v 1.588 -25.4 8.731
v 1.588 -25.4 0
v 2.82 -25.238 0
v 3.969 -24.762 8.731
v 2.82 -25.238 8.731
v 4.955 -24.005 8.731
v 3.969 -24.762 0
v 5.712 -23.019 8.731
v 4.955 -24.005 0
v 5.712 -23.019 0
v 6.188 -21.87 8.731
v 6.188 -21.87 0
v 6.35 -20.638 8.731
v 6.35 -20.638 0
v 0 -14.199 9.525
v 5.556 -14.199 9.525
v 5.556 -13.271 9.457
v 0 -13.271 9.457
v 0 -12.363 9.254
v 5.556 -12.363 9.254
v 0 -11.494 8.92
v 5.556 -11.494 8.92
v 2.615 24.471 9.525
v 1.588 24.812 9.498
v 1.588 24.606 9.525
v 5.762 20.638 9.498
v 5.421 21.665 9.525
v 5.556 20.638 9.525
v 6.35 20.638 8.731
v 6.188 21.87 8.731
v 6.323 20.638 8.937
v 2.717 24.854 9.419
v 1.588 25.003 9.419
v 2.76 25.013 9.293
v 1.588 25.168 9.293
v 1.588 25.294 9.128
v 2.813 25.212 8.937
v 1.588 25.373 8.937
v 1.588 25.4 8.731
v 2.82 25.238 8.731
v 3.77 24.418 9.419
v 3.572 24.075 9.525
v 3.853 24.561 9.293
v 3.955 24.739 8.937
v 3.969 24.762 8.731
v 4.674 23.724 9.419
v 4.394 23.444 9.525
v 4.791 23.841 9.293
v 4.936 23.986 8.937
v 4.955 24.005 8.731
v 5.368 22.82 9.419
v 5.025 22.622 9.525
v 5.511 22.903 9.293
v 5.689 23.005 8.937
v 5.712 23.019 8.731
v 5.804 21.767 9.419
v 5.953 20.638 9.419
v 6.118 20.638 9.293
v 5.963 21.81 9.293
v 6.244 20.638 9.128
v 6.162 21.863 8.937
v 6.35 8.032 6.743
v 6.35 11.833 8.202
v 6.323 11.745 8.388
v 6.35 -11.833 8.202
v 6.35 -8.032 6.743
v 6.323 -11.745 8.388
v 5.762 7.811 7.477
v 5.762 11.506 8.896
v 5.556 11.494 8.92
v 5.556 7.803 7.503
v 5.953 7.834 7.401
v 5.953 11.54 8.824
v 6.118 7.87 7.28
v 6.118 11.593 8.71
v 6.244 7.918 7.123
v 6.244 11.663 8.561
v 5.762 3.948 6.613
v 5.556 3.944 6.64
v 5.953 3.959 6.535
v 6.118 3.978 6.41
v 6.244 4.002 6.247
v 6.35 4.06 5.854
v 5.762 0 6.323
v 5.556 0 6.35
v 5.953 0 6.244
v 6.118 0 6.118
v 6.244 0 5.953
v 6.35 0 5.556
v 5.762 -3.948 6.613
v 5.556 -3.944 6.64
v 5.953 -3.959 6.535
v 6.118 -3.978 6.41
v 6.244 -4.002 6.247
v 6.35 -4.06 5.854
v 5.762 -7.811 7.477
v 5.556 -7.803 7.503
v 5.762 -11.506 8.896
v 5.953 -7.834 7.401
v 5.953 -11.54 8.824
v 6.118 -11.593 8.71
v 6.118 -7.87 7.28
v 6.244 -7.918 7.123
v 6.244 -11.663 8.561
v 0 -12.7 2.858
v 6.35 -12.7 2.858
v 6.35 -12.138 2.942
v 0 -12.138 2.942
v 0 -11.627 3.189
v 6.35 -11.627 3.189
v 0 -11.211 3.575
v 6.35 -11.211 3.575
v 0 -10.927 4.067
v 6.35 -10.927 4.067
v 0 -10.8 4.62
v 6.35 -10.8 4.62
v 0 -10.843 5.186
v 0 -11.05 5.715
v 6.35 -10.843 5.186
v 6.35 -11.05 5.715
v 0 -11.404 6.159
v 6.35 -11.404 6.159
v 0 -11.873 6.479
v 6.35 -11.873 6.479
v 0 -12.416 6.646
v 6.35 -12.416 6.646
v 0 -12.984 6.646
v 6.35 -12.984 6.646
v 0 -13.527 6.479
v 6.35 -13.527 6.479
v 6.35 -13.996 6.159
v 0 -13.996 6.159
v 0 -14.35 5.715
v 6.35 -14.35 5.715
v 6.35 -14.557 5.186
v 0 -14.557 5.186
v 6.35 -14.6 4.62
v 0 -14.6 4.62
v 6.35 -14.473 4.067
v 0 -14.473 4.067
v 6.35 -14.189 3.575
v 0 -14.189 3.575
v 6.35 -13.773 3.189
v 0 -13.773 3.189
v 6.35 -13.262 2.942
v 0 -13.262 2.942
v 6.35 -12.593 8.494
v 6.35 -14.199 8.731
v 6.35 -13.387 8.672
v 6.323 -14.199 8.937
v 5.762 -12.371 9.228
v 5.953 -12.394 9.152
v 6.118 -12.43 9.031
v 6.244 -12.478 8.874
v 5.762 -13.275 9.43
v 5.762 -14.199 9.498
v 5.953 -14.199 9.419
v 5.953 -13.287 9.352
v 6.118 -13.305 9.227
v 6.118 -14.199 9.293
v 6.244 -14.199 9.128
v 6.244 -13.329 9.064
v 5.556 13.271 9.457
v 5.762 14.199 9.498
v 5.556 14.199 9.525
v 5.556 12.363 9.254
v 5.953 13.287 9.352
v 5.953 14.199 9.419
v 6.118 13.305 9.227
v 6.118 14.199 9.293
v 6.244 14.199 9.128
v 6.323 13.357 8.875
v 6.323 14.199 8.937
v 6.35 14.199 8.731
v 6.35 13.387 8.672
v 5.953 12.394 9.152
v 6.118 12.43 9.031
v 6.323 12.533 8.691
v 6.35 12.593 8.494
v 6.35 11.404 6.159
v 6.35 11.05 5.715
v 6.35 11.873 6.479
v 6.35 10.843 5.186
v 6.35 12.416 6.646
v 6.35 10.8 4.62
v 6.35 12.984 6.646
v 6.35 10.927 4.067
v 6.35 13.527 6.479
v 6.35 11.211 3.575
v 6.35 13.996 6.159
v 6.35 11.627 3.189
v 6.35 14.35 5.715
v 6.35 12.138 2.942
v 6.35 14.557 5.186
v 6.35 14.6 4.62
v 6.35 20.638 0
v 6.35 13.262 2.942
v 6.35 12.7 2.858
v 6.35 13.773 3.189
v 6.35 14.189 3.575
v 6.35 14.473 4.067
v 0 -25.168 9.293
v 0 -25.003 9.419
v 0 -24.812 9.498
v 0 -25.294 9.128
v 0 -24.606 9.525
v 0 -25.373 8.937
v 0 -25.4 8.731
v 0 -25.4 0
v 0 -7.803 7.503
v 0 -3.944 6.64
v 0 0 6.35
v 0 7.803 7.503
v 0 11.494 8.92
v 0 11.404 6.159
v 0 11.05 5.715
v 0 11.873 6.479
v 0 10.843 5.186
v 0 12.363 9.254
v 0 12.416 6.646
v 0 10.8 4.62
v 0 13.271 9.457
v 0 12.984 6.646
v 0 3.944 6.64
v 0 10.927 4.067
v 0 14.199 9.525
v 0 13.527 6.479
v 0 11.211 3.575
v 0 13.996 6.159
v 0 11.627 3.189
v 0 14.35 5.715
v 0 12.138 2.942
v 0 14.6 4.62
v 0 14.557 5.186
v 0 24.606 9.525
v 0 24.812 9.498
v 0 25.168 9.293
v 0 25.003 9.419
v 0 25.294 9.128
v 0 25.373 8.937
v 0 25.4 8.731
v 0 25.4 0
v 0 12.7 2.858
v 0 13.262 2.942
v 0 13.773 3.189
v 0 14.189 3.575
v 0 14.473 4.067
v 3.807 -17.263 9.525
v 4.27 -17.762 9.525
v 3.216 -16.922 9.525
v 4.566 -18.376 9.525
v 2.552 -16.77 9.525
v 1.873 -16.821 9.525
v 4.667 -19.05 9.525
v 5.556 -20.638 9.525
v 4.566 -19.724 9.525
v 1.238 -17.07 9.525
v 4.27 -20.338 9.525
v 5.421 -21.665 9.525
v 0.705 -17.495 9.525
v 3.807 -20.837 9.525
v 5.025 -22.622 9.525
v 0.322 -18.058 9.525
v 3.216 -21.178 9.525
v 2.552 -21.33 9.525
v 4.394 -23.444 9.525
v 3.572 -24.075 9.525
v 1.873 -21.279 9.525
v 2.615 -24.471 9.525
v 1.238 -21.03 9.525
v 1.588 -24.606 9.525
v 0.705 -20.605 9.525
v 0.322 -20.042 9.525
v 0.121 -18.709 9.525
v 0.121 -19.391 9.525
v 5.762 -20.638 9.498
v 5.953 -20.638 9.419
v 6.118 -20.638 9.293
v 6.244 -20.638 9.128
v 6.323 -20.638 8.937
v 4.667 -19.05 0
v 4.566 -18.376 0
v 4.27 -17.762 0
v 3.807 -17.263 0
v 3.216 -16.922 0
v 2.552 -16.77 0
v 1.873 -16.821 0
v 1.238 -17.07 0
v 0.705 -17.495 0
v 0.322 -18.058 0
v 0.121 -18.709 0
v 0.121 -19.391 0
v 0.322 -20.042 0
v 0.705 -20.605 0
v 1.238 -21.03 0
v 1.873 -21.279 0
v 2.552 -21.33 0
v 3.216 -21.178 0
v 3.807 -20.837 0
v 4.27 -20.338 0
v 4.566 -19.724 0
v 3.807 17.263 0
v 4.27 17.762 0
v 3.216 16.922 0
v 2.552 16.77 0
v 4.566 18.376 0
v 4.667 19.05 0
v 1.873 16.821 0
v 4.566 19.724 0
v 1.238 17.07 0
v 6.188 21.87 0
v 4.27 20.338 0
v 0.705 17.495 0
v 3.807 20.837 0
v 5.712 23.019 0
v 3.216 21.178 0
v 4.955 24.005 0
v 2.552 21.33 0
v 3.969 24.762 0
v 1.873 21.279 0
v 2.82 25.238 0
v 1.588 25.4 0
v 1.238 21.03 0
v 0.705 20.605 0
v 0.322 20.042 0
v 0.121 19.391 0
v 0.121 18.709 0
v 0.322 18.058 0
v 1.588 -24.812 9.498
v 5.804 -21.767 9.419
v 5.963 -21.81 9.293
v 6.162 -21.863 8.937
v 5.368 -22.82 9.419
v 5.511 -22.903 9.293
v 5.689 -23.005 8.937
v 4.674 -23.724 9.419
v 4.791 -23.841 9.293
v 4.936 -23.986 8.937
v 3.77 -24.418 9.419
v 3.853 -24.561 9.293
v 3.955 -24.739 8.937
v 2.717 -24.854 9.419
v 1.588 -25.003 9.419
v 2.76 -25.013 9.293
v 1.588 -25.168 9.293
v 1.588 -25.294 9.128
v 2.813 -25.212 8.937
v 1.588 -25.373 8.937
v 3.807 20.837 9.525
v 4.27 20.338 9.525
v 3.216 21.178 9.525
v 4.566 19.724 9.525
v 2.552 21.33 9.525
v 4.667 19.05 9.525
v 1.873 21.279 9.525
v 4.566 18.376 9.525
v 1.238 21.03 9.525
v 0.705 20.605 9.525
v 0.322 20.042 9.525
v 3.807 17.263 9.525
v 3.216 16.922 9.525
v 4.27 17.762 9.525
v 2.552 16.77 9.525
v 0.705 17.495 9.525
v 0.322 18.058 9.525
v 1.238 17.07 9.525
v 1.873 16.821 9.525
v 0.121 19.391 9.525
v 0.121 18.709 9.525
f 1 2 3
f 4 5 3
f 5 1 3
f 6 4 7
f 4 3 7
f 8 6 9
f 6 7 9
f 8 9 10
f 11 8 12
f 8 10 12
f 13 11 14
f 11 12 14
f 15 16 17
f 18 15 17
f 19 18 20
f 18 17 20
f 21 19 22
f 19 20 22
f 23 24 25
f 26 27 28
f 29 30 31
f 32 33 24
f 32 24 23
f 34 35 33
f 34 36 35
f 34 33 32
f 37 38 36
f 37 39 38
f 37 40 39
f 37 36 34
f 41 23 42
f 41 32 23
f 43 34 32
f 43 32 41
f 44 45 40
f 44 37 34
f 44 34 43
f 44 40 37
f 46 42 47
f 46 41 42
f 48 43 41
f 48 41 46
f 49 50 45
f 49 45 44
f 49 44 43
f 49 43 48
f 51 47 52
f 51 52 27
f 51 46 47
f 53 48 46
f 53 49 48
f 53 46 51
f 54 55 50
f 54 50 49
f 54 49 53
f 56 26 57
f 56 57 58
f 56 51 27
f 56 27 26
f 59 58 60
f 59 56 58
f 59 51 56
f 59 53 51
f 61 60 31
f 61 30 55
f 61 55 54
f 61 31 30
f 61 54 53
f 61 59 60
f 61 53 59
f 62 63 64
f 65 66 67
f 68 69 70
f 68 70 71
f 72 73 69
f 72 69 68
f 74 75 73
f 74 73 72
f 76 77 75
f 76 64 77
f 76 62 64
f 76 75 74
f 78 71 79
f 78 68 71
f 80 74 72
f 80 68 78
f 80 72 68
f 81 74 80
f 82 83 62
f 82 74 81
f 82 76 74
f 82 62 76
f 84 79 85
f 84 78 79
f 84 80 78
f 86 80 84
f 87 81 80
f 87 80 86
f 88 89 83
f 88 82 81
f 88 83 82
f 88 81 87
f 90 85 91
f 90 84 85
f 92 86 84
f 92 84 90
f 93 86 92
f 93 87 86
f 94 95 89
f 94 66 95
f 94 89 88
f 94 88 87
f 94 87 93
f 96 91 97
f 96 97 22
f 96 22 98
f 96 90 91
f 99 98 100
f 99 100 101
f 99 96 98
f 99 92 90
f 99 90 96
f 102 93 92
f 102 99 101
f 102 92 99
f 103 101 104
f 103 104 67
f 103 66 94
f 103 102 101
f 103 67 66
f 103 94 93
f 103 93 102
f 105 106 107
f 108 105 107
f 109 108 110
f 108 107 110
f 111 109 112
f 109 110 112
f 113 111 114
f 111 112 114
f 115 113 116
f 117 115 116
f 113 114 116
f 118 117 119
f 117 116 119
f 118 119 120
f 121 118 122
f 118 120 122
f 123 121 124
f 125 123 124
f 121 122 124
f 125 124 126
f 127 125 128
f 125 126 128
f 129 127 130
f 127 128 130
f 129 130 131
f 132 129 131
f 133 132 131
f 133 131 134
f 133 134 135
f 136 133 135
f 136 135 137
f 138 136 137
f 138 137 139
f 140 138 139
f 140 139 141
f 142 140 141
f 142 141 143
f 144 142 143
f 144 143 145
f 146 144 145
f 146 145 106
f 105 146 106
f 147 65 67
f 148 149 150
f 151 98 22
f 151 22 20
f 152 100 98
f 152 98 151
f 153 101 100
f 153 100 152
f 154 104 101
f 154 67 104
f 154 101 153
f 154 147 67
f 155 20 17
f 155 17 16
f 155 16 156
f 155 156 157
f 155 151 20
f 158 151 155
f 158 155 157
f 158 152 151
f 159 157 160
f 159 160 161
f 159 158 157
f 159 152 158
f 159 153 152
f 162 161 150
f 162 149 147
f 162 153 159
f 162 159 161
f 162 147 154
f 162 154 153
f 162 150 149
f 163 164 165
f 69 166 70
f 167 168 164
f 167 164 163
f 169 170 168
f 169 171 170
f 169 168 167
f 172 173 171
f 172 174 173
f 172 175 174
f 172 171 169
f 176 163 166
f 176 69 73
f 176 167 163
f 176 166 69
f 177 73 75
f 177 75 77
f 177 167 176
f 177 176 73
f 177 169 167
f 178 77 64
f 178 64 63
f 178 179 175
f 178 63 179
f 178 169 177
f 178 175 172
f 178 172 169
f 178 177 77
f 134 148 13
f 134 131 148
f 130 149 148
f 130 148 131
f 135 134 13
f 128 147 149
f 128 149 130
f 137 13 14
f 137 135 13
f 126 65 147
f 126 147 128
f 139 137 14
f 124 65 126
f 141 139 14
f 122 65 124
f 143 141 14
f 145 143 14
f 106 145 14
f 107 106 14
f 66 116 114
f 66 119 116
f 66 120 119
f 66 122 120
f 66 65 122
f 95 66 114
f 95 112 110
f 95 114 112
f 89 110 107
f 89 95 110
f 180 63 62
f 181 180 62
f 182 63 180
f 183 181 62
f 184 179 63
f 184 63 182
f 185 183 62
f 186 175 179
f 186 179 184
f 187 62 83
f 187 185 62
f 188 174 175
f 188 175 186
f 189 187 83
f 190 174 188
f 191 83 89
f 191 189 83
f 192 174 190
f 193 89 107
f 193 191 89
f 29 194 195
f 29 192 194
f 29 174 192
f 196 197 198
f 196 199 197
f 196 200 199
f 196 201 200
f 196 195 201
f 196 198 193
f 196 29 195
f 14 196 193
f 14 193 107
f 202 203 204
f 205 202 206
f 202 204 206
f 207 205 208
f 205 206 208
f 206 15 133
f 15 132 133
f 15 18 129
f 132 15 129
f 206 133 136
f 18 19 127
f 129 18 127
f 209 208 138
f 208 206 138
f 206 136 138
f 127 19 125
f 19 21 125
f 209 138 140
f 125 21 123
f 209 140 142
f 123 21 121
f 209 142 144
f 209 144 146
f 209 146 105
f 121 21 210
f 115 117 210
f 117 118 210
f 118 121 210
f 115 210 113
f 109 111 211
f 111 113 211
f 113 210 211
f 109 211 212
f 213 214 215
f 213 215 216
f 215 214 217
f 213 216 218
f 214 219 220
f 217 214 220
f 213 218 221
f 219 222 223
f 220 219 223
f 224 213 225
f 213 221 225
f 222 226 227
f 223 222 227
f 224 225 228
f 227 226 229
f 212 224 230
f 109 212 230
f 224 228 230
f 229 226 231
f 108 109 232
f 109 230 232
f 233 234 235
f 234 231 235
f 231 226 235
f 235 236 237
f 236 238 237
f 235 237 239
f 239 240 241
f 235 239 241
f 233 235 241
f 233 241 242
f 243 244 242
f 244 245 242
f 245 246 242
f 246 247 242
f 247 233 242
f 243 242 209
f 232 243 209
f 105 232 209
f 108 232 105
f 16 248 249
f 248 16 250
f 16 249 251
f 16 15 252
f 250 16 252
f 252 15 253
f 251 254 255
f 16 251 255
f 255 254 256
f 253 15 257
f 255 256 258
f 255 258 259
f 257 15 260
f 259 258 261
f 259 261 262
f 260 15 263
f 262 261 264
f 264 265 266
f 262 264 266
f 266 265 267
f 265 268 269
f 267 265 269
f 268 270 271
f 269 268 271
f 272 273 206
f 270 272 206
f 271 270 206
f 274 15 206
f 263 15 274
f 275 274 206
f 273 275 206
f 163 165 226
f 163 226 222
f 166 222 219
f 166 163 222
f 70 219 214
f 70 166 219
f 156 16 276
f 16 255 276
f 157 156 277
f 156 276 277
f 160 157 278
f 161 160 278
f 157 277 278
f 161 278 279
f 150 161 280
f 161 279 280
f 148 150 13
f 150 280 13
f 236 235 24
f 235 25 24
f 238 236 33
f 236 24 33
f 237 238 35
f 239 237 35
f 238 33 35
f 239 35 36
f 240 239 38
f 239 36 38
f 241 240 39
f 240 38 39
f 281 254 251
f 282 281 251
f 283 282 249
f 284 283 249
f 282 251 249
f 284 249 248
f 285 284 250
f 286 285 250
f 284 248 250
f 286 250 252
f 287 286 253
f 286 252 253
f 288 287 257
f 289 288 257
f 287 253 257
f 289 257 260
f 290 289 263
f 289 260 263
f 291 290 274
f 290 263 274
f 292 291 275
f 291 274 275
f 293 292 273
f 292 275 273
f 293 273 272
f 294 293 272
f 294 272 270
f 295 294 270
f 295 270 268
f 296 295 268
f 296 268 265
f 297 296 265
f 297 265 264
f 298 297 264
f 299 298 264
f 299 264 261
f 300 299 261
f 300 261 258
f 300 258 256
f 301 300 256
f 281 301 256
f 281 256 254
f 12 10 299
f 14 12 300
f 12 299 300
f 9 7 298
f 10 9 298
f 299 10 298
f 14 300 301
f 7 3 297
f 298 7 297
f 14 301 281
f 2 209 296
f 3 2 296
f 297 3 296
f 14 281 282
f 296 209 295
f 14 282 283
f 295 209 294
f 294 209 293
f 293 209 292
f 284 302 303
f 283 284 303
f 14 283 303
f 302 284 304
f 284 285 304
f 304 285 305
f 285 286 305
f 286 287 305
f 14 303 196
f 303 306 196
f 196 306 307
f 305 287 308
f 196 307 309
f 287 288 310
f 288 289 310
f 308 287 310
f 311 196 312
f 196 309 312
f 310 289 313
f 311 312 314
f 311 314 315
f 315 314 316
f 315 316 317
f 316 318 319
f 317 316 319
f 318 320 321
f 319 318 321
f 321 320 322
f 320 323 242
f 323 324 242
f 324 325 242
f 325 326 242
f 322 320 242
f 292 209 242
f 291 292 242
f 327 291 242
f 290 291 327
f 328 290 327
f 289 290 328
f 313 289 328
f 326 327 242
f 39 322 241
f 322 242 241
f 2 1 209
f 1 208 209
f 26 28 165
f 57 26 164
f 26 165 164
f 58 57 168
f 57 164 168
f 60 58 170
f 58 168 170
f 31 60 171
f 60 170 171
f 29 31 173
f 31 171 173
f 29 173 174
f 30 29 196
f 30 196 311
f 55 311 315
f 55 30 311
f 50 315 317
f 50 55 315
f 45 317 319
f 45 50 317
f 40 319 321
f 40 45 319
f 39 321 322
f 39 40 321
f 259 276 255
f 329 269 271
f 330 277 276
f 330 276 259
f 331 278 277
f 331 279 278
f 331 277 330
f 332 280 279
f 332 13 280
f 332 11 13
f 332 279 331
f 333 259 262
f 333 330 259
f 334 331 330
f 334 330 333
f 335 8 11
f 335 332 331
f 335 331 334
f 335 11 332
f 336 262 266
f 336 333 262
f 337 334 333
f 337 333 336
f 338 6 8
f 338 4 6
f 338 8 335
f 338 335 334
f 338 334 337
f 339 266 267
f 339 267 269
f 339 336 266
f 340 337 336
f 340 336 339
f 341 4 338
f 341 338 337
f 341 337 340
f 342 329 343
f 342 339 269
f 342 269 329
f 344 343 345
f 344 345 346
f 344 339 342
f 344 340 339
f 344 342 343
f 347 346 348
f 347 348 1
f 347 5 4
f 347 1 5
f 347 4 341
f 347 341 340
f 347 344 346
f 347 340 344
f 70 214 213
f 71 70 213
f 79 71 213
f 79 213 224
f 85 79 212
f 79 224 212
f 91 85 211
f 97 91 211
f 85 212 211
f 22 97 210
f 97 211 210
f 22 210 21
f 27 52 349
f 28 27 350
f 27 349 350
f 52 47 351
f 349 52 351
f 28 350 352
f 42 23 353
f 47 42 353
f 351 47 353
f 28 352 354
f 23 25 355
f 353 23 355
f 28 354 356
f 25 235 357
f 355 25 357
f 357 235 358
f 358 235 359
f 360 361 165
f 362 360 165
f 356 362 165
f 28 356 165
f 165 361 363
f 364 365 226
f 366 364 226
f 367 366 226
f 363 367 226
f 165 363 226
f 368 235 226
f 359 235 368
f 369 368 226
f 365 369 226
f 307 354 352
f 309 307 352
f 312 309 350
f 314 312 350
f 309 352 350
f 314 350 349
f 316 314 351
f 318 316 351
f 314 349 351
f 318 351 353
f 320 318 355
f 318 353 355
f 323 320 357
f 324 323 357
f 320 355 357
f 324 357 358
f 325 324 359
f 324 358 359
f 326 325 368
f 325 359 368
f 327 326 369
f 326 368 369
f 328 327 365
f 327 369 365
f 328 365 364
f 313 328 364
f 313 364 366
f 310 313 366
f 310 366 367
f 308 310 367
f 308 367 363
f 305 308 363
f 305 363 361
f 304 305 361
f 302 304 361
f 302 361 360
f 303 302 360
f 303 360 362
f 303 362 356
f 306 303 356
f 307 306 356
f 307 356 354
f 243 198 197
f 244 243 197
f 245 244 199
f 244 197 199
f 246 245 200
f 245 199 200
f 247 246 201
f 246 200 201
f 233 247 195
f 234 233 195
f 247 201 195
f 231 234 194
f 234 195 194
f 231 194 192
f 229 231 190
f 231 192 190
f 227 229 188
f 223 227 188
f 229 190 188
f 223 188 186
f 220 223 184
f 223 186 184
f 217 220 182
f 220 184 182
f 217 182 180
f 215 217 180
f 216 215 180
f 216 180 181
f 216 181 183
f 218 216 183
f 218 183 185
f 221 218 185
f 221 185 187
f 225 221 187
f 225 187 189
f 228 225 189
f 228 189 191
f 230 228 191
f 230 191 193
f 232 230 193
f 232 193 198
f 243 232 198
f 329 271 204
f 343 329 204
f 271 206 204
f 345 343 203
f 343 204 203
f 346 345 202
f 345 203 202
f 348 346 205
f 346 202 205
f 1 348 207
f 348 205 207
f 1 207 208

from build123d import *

# Parameters (mm, degrees)
BOSS_EXTRUDE1_DEPTH = 6.35
CUT_EXTRUDE1_REACH  = 29.861
SKETCH2_R           = 2.286
CUT_EXTRUDE2_REACH  = 29.861
SKETCH3_R           = 1.905
FILLET1_R           = 4.7625
FILLET2_R           = 6.35
FILLET3_R           = 0.79375


with BuildPart() as part:
    # Sketch1 → Boss-Extrude1 (new body)
    with BuildSketch(Plane(origin=(0, 0, 0), x_dir=(0, 0, -1), z_dir=(1, 0, 0))):
        with BuildLine():
            Line((0, -25.4), (0, 25.4))
            Line((0, 25.4), (-9.525, 25.4))
            Line((-9.525, 25.4), (-9.525, 12.7))
            ThreePointArc((-9.525, 12.7), (-6.35, 0), (-9.525, -12.7))
            Line((-9.525, -12.7), (-9.525, -25.4))
            Line((-9.525, -25.4), (0, -25.4))
        make_face()
    extrude(amount=BOSS_EXTRUDE1_DEPTH)

    # Sketch2 → Cut-Extrude1 (cut, up to next)
    with BuildSketch(Plane.XY.offset(9.525), mode=Mode.PRIVATE) as cut_extrude1_sk1:
        with Locations((2.38125, 19.05)):
            Circle(SKETCH2_R)
    cut_extrude1_tool1 = extrude(cut_extrude1_sk1.sketch, amount=-CUT_EXTRUDE1_REACH, mode=Mode.PRIVATE) & part.part
    # Sketch2 → Cut-Extrude1 (cut, up to next)
    with BuildSketch(Plane.XY.offset(9.525), mode=Mode.PRIVATE) as cut_extrude1_sk2:
        with Locations((2.38125, -19.05)):
            Circle(SKETCH2_R)
    cut_extrude1_tool2 = extrude(cut_extrude1_sk2.sketch, amount=-CUT_EXTRUDE1_REACH, mode=Mode.PRIVATE) & part.part
    add(cut_extrude1_tool1.solids().sort_by_distance((2.38125, 19.05, 9.525))[0], mode=Mode.SUBTRACT)
    add(cut_extrude1_tool2.solids().sort_by_distance((2.38125, -19.05, 9.525))[0], mode=Mode.SUBTRACT)

    # Sketch3 → Cut-Extrude2 (cut, up to next)
    with BuildSketch(Plane(origin=(6.35, 0, 0), x_dir=(0, 0, -1), z_dir=(1, 0, 0)), mode=Mode.PRIVATE) as cut_extrude2_sk1:
        with Locations((-4.7625, 12.7)):
            Circle(SKETCH3_R)
    cut_extrude2_tool1 = extrude(cut_extrude2_sk1.sketch, amount=-CUT_EXTRUDE2_REACH, mode=Mode.PRIVATE) & part.part
    # Sketch3 → Cut-Extrude2 (cut, up to next)
    with BuildSketch(Plane(origin=(6.35, 0, 0), x_dir=(0, 0, -1), z_dir=(1, 0, 0)), mode=Mode.PRIVATE) as cut_extrude2_sk2:
        with Locations((-4.7625, -12.7)):
            Circle(SKETCH3_R)
    cut_extrude2_tool2 = extrude(cut_extrude2_sk2.sketch, amount=-CUT_EXTRUDE2_REACH, mode=Mode.PRIVATE) & part.part
    add(cut_extrude2_tool1.solids().sort_by_distance((6.35, 12.7, 4.7625))[0], mode=Mode.SUBTRACT)
    add(cut_extrude2_tool2.solids().sort_by_distance((6.35, -12.7, 4.7625))[0], mode=Mode.SUBTRACT)

    # Fillet1
    fillet1_edges = [part.edges().sort_by_distance(p)[0] for p in [
        (6.35, 25.4, 4.7625),
        (6.35, -25.4, 4.7625),
    ]]
    fillet(fillet1_edges, radius=FILLET1_R)

    # Fillet2
    fillet2_edges = [part.edges().sort_by_distance(p)[0] for p in [
        (3.175, -12.7, 9.525),
        (3.175, 12.7, 9.525),
    ]]
    fillet(fillet2_edges, radius=FILLET2_R)

    # Fillet3
    fillet3_edges = [part.edges().sort_by_distance(p)[0] for p in [
        (6.35, 17.418265829, 9.525),
        (0.79375, -25.4, 9.525),
        (4.955096045, -24.005096045, 9.525),
        (0.79375, 25.4, 9.525),
        (4.955096045, 24.005096045, 9.525),
        (6.35, -17.418265829, 9.525),
        (6.35, 0, 6.35),
        (6.35, 12.813348054, 9.371965463),
        (6.35, -12.813348054, 9.371965463),
    ]]
    fillet(fillet3_edges, radius=FILLET3_R)


solid = part.part
